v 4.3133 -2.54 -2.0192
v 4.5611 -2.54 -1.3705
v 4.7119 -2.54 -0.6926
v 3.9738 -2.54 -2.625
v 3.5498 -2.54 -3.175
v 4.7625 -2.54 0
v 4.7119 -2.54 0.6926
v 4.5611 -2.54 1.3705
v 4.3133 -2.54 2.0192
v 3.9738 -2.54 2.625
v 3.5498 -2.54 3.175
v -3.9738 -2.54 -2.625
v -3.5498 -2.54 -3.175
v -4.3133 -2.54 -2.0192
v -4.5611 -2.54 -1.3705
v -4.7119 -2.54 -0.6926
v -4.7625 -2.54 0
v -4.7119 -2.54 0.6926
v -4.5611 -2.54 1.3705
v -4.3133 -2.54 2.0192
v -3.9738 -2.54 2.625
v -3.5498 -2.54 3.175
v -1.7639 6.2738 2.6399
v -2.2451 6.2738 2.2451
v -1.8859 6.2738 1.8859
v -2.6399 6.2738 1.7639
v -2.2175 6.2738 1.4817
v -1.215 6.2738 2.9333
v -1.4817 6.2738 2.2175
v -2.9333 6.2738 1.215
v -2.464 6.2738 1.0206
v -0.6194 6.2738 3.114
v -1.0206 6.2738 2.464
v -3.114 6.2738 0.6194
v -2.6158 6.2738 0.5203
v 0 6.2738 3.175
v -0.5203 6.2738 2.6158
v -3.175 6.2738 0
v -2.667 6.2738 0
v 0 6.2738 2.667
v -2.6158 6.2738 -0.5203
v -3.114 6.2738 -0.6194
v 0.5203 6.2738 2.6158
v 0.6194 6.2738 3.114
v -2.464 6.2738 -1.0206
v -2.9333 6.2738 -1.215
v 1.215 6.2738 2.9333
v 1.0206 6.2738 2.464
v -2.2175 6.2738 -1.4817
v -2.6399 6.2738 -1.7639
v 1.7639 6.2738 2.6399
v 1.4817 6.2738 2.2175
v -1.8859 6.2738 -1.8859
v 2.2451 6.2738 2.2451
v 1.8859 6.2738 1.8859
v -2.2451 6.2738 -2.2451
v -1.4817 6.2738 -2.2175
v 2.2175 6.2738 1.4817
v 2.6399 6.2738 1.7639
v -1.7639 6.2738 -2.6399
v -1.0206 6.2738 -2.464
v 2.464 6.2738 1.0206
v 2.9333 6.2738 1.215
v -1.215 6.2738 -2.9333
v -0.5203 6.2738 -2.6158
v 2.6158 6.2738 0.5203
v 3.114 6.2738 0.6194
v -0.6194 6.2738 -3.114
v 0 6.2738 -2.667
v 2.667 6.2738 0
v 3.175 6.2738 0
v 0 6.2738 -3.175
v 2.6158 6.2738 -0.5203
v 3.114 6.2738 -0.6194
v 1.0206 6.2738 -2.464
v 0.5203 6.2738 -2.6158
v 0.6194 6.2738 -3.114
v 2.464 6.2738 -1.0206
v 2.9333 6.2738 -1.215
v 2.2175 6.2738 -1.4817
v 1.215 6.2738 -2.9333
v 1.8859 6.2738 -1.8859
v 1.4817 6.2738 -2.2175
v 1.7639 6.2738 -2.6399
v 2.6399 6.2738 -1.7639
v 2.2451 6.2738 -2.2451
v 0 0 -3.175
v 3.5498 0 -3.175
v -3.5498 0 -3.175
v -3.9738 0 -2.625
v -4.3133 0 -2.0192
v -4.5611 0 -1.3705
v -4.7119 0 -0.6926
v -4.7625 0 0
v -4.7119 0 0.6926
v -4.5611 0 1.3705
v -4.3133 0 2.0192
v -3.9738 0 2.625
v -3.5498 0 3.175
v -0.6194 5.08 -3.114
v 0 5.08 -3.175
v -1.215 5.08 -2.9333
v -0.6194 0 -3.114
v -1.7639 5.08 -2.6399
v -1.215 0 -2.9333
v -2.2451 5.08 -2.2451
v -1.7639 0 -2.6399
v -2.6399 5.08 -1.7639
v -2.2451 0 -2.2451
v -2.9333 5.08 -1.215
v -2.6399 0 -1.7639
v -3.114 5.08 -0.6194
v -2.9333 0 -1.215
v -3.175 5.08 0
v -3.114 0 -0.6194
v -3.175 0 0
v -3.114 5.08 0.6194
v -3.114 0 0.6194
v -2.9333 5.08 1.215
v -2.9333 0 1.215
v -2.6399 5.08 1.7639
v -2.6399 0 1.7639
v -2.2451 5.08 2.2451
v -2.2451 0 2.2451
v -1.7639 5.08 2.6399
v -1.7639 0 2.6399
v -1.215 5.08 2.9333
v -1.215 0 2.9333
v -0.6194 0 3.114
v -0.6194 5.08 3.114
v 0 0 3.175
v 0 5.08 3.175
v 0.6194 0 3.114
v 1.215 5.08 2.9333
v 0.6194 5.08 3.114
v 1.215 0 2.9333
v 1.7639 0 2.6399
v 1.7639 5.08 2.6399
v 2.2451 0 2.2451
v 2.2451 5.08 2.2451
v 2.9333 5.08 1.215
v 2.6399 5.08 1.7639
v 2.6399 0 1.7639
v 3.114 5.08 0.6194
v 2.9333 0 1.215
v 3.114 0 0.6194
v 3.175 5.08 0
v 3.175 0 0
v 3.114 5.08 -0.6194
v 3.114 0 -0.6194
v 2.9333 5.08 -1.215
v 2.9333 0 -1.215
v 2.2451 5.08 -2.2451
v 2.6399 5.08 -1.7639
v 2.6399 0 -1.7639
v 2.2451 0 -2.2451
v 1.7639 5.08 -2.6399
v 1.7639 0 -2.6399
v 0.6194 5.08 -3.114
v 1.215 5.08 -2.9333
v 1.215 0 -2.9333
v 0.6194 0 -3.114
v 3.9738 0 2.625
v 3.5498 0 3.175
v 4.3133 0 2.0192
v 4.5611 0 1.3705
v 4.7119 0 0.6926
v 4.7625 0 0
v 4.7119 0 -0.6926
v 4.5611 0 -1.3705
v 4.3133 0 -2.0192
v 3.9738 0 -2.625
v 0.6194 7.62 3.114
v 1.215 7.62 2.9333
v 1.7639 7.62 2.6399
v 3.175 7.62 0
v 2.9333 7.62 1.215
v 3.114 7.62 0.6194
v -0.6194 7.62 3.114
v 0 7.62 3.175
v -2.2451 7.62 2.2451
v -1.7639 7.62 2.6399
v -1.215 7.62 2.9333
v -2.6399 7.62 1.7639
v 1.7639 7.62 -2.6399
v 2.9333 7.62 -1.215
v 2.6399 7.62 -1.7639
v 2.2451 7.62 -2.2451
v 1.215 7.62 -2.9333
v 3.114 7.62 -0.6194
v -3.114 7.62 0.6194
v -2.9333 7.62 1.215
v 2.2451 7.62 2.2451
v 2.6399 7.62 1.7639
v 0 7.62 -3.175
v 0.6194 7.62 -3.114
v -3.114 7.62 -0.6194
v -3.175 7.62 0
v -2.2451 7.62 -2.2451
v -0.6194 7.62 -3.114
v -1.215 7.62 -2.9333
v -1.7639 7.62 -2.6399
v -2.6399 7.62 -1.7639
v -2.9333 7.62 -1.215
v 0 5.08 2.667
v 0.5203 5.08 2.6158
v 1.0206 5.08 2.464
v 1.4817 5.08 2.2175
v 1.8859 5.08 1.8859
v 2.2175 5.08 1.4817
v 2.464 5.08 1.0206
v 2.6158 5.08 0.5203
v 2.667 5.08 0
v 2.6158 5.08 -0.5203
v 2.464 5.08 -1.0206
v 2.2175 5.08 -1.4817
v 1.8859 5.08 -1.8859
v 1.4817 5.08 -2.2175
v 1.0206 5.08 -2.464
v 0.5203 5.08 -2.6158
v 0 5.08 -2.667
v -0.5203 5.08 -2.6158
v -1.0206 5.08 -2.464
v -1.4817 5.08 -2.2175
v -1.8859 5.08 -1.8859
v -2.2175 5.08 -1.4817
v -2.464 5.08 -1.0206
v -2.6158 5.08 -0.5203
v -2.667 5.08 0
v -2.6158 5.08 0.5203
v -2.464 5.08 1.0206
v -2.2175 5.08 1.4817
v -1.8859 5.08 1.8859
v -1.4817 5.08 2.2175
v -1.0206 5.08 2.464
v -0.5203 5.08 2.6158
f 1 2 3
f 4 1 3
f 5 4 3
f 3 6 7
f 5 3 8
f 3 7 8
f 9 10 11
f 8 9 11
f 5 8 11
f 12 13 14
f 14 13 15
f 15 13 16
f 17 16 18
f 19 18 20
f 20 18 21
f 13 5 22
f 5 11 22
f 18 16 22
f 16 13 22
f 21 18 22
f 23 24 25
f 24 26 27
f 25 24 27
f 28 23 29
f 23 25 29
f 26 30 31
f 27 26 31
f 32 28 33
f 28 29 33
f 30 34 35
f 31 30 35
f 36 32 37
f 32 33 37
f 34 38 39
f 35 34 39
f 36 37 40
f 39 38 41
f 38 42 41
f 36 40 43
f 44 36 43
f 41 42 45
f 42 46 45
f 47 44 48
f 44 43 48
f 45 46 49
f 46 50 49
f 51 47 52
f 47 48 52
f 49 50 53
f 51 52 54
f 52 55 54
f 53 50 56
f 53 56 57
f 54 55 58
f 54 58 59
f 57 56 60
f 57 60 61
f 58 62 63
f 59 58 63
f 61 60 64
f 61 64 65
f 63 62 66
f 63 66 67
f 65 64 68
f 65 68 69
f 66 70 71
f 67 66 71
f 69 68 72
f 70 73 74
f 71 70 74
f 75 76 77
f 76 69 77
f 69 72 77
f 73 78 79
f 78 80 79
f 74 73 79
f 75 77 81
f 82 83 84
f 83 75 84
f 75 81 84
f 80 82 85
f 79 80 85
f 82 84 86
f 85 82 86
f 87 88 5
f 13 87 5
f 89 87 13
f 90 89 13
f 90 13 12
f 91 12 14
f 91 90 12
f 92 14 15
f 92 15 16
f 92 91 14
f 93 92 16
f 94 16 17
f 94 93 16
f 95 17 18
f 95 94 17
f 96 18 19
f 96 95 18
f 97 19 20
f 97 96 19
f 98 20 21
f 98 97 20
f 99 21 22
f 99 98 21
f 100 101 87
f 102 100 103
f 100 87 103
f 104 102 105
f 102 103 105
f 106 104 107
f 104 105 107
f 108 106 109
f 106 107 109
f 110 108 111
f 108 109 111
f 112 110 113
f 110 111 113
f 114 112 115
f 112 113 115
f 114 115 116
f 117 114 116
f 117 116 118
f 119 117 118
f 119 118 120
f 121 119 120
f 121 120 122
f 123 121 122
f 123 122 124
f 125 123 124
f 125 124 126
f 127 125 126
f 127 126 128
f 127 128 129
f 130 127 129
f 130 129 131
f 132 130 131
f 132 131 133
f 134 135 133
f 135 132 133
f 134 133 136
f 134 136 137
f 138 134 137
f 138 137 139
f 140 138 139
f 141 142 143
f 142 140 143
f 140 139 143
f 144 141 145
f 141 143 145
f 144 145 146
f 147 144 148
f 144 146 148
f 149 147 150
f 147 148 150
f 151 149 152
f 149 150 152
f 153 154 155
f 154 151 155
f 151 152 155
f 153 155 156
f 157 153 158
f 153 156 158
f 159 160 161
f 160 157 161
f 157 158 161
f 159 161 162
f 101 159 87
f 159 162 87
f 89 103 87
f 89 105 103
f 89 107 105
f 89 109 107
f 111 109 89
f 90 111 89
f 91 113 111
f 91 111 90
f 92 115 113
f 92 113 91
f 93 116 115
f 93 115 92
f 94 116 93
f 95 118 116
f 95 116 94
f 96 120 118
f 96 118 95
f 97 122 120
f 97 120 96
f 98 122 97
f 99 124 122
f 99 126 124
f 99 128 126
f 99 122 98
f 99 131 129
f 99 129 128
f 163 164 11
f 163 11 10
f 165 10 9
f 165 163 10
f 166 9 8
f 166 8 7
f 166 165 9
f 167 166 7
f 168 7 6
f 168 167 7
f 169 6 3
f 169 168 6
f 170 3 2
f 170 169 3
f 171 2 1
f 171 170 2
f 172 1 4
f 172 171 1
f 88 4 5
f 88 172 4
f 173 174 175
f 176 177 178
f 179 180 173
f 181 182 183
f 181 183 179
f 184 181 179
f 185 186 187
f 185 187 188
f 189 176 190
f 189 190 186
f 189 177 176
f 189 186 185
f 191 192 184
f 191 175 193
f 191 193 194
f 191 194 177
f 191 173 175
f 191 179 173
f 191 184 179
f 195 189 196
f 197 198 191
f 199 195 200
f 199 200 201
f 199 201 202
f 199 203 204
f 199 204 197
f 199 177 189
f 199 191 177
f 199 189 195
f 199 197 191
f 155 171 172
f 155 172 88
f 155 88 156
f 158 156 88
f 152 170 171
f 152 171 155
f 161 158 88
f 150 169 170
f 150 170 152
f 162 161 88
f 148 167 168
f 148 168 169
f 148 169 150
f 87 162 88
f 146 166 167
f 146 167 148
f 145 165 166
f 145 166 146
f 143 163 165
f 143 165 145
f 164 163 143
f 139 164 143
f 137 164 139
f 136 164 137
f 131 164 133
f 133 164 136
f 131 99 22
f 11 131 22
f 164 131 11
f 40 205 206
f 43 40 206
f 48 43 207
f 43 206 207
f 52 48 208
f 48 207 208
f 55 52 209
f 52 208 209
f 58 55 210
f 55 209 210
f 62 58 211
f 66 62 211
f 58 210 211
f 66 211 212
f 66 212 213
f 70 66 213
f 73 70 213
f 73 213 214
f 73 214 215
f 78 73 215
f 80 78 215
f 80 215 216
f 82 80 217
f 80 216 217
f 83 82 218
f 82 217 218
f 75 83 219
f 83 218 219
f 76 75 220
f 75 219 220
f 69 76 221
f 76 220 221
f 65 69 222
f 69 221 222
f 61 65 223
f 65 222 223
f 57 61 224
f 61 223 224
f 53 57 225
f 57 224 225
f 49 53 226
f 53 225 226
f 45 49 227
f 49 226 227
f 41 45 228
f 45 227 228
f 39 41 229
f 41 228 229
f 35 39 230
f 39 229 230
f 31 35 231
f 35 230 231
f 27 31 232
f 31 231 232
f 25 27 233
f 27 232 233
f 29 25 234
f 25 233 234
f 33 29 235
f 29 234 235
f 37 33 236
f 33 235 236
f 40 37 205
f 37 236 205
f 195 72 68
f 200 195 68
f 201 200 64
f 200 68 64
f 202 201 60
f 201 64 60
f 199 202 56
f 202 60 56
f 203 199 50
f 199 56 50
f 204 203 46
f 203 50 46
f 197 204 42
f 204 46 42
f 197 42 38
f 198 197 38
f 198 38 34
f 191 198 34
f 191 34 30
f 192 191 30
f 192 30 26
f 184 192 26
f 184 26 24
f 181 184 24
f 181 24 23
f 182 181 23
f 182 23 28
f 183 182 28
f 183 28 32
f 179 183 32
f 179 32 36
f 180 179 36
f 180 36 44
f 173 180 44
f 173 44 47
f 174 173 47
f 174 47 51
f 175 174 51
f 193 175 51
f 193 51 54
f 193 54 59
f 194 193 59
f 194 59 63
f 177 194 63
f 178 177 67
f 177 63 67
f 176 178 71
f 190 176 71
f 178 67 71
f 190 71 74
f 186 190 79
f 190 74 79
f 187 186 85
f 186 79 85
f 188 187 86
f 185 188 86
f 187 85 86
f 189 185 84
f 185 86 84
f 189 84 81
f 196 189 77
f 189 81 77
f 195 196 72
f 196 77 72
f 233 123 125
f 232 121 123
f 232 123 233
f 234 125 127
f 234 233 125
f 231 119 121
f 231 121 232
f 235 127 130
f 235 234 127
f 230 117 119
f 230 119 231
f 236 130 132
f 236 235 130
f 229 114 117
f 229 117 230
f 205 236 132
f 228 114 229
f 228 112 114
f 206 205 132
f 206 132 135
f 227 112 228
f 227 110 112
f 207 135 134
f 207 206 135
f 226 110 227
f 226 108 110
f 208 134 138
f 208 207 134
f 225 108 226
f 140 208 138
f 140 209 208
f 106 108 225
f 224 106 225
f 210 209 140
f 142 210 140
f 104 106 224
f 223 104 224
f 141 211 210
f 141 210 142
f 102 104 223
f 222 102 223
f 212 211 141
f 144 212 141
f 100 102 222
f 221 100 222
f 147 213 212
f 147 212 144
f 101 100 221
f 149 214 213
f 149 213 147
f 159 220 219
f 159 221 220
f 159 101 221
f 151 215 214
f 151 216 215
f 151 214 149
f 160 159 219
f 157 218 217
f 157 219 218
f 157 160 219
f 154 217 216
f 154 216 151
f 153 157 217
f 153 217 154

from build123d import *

# Parameters (mm, degrees)
SKETCH1_R           = 3.175
BOSS_EXTRUDE1_DEPTH = 7.62
BOSS_EXTRUDE2_DEPTH = 2.54
SKETCH6_OUTSIDE_W   = 14.587
SKETCH6_OUTSIDE_H   = 11.412
SKETCH6_OUTSIDE_R   = 2.667
CUT_EXTRUDE1_DEPTH  = 1.1938


with BuildPart() as part:
    # Sketch1 → Boss-Extrude1 (new body)
    with BuildSketch(Plane(origin=(0, 0, 0), x_dir=(1, 0, 0), z_dir=(0, 1, 0))):
        with Locations(Location((0, 0, 0), (0, 0, 90))):
            Circle(SKETCH1_R)
    extrude(amount=BOSS_EXTRUDE1_DEPTH)

    # Sketch2 → Boss-Extrude2 (add)
    with BuildSketch(Plane.XZ):
        with BuildLine():
            Line((-3.549757914, 3.175), (3.549757914, 3.175))
            ThreePointArc((3.549757914, 3.175), (4.7625, 0), (3.549757914, -3.175))
            Line((3.549757914, -3.175), (-3.549757914, -3.175))
            ThreePointArc((-3.549757914, -3.175), (-4.7625, 0), (-3.549757914, 3.175))
        make_face()
    extrude(amount=BOSS_EXTRUDE2_DEPTH)

    # Sketch6 outside → Cut-Extrude1 (cut)
    with BuildSketch(Plane(origin=(0, 5.08, 0), x_dir=(1, 0, 0), z_dir=(0, 1, 0))):
        with Locations((0.0005, 0)):
            Rectangle(SKETCH6_OUTSIDE_W, SKETCH6_OUTSIDE_H)
        with Locations(Location((0, 0, 0), (0, 0, 270))):
            Circle(SKETCH6_OUTSIDE_R, mode=Mode.SUBTRACT)
    extrude(amount=CUT_EXTRUDE1_DEPTH, mode=Mode.SUBTRACT)


solid = part.part
